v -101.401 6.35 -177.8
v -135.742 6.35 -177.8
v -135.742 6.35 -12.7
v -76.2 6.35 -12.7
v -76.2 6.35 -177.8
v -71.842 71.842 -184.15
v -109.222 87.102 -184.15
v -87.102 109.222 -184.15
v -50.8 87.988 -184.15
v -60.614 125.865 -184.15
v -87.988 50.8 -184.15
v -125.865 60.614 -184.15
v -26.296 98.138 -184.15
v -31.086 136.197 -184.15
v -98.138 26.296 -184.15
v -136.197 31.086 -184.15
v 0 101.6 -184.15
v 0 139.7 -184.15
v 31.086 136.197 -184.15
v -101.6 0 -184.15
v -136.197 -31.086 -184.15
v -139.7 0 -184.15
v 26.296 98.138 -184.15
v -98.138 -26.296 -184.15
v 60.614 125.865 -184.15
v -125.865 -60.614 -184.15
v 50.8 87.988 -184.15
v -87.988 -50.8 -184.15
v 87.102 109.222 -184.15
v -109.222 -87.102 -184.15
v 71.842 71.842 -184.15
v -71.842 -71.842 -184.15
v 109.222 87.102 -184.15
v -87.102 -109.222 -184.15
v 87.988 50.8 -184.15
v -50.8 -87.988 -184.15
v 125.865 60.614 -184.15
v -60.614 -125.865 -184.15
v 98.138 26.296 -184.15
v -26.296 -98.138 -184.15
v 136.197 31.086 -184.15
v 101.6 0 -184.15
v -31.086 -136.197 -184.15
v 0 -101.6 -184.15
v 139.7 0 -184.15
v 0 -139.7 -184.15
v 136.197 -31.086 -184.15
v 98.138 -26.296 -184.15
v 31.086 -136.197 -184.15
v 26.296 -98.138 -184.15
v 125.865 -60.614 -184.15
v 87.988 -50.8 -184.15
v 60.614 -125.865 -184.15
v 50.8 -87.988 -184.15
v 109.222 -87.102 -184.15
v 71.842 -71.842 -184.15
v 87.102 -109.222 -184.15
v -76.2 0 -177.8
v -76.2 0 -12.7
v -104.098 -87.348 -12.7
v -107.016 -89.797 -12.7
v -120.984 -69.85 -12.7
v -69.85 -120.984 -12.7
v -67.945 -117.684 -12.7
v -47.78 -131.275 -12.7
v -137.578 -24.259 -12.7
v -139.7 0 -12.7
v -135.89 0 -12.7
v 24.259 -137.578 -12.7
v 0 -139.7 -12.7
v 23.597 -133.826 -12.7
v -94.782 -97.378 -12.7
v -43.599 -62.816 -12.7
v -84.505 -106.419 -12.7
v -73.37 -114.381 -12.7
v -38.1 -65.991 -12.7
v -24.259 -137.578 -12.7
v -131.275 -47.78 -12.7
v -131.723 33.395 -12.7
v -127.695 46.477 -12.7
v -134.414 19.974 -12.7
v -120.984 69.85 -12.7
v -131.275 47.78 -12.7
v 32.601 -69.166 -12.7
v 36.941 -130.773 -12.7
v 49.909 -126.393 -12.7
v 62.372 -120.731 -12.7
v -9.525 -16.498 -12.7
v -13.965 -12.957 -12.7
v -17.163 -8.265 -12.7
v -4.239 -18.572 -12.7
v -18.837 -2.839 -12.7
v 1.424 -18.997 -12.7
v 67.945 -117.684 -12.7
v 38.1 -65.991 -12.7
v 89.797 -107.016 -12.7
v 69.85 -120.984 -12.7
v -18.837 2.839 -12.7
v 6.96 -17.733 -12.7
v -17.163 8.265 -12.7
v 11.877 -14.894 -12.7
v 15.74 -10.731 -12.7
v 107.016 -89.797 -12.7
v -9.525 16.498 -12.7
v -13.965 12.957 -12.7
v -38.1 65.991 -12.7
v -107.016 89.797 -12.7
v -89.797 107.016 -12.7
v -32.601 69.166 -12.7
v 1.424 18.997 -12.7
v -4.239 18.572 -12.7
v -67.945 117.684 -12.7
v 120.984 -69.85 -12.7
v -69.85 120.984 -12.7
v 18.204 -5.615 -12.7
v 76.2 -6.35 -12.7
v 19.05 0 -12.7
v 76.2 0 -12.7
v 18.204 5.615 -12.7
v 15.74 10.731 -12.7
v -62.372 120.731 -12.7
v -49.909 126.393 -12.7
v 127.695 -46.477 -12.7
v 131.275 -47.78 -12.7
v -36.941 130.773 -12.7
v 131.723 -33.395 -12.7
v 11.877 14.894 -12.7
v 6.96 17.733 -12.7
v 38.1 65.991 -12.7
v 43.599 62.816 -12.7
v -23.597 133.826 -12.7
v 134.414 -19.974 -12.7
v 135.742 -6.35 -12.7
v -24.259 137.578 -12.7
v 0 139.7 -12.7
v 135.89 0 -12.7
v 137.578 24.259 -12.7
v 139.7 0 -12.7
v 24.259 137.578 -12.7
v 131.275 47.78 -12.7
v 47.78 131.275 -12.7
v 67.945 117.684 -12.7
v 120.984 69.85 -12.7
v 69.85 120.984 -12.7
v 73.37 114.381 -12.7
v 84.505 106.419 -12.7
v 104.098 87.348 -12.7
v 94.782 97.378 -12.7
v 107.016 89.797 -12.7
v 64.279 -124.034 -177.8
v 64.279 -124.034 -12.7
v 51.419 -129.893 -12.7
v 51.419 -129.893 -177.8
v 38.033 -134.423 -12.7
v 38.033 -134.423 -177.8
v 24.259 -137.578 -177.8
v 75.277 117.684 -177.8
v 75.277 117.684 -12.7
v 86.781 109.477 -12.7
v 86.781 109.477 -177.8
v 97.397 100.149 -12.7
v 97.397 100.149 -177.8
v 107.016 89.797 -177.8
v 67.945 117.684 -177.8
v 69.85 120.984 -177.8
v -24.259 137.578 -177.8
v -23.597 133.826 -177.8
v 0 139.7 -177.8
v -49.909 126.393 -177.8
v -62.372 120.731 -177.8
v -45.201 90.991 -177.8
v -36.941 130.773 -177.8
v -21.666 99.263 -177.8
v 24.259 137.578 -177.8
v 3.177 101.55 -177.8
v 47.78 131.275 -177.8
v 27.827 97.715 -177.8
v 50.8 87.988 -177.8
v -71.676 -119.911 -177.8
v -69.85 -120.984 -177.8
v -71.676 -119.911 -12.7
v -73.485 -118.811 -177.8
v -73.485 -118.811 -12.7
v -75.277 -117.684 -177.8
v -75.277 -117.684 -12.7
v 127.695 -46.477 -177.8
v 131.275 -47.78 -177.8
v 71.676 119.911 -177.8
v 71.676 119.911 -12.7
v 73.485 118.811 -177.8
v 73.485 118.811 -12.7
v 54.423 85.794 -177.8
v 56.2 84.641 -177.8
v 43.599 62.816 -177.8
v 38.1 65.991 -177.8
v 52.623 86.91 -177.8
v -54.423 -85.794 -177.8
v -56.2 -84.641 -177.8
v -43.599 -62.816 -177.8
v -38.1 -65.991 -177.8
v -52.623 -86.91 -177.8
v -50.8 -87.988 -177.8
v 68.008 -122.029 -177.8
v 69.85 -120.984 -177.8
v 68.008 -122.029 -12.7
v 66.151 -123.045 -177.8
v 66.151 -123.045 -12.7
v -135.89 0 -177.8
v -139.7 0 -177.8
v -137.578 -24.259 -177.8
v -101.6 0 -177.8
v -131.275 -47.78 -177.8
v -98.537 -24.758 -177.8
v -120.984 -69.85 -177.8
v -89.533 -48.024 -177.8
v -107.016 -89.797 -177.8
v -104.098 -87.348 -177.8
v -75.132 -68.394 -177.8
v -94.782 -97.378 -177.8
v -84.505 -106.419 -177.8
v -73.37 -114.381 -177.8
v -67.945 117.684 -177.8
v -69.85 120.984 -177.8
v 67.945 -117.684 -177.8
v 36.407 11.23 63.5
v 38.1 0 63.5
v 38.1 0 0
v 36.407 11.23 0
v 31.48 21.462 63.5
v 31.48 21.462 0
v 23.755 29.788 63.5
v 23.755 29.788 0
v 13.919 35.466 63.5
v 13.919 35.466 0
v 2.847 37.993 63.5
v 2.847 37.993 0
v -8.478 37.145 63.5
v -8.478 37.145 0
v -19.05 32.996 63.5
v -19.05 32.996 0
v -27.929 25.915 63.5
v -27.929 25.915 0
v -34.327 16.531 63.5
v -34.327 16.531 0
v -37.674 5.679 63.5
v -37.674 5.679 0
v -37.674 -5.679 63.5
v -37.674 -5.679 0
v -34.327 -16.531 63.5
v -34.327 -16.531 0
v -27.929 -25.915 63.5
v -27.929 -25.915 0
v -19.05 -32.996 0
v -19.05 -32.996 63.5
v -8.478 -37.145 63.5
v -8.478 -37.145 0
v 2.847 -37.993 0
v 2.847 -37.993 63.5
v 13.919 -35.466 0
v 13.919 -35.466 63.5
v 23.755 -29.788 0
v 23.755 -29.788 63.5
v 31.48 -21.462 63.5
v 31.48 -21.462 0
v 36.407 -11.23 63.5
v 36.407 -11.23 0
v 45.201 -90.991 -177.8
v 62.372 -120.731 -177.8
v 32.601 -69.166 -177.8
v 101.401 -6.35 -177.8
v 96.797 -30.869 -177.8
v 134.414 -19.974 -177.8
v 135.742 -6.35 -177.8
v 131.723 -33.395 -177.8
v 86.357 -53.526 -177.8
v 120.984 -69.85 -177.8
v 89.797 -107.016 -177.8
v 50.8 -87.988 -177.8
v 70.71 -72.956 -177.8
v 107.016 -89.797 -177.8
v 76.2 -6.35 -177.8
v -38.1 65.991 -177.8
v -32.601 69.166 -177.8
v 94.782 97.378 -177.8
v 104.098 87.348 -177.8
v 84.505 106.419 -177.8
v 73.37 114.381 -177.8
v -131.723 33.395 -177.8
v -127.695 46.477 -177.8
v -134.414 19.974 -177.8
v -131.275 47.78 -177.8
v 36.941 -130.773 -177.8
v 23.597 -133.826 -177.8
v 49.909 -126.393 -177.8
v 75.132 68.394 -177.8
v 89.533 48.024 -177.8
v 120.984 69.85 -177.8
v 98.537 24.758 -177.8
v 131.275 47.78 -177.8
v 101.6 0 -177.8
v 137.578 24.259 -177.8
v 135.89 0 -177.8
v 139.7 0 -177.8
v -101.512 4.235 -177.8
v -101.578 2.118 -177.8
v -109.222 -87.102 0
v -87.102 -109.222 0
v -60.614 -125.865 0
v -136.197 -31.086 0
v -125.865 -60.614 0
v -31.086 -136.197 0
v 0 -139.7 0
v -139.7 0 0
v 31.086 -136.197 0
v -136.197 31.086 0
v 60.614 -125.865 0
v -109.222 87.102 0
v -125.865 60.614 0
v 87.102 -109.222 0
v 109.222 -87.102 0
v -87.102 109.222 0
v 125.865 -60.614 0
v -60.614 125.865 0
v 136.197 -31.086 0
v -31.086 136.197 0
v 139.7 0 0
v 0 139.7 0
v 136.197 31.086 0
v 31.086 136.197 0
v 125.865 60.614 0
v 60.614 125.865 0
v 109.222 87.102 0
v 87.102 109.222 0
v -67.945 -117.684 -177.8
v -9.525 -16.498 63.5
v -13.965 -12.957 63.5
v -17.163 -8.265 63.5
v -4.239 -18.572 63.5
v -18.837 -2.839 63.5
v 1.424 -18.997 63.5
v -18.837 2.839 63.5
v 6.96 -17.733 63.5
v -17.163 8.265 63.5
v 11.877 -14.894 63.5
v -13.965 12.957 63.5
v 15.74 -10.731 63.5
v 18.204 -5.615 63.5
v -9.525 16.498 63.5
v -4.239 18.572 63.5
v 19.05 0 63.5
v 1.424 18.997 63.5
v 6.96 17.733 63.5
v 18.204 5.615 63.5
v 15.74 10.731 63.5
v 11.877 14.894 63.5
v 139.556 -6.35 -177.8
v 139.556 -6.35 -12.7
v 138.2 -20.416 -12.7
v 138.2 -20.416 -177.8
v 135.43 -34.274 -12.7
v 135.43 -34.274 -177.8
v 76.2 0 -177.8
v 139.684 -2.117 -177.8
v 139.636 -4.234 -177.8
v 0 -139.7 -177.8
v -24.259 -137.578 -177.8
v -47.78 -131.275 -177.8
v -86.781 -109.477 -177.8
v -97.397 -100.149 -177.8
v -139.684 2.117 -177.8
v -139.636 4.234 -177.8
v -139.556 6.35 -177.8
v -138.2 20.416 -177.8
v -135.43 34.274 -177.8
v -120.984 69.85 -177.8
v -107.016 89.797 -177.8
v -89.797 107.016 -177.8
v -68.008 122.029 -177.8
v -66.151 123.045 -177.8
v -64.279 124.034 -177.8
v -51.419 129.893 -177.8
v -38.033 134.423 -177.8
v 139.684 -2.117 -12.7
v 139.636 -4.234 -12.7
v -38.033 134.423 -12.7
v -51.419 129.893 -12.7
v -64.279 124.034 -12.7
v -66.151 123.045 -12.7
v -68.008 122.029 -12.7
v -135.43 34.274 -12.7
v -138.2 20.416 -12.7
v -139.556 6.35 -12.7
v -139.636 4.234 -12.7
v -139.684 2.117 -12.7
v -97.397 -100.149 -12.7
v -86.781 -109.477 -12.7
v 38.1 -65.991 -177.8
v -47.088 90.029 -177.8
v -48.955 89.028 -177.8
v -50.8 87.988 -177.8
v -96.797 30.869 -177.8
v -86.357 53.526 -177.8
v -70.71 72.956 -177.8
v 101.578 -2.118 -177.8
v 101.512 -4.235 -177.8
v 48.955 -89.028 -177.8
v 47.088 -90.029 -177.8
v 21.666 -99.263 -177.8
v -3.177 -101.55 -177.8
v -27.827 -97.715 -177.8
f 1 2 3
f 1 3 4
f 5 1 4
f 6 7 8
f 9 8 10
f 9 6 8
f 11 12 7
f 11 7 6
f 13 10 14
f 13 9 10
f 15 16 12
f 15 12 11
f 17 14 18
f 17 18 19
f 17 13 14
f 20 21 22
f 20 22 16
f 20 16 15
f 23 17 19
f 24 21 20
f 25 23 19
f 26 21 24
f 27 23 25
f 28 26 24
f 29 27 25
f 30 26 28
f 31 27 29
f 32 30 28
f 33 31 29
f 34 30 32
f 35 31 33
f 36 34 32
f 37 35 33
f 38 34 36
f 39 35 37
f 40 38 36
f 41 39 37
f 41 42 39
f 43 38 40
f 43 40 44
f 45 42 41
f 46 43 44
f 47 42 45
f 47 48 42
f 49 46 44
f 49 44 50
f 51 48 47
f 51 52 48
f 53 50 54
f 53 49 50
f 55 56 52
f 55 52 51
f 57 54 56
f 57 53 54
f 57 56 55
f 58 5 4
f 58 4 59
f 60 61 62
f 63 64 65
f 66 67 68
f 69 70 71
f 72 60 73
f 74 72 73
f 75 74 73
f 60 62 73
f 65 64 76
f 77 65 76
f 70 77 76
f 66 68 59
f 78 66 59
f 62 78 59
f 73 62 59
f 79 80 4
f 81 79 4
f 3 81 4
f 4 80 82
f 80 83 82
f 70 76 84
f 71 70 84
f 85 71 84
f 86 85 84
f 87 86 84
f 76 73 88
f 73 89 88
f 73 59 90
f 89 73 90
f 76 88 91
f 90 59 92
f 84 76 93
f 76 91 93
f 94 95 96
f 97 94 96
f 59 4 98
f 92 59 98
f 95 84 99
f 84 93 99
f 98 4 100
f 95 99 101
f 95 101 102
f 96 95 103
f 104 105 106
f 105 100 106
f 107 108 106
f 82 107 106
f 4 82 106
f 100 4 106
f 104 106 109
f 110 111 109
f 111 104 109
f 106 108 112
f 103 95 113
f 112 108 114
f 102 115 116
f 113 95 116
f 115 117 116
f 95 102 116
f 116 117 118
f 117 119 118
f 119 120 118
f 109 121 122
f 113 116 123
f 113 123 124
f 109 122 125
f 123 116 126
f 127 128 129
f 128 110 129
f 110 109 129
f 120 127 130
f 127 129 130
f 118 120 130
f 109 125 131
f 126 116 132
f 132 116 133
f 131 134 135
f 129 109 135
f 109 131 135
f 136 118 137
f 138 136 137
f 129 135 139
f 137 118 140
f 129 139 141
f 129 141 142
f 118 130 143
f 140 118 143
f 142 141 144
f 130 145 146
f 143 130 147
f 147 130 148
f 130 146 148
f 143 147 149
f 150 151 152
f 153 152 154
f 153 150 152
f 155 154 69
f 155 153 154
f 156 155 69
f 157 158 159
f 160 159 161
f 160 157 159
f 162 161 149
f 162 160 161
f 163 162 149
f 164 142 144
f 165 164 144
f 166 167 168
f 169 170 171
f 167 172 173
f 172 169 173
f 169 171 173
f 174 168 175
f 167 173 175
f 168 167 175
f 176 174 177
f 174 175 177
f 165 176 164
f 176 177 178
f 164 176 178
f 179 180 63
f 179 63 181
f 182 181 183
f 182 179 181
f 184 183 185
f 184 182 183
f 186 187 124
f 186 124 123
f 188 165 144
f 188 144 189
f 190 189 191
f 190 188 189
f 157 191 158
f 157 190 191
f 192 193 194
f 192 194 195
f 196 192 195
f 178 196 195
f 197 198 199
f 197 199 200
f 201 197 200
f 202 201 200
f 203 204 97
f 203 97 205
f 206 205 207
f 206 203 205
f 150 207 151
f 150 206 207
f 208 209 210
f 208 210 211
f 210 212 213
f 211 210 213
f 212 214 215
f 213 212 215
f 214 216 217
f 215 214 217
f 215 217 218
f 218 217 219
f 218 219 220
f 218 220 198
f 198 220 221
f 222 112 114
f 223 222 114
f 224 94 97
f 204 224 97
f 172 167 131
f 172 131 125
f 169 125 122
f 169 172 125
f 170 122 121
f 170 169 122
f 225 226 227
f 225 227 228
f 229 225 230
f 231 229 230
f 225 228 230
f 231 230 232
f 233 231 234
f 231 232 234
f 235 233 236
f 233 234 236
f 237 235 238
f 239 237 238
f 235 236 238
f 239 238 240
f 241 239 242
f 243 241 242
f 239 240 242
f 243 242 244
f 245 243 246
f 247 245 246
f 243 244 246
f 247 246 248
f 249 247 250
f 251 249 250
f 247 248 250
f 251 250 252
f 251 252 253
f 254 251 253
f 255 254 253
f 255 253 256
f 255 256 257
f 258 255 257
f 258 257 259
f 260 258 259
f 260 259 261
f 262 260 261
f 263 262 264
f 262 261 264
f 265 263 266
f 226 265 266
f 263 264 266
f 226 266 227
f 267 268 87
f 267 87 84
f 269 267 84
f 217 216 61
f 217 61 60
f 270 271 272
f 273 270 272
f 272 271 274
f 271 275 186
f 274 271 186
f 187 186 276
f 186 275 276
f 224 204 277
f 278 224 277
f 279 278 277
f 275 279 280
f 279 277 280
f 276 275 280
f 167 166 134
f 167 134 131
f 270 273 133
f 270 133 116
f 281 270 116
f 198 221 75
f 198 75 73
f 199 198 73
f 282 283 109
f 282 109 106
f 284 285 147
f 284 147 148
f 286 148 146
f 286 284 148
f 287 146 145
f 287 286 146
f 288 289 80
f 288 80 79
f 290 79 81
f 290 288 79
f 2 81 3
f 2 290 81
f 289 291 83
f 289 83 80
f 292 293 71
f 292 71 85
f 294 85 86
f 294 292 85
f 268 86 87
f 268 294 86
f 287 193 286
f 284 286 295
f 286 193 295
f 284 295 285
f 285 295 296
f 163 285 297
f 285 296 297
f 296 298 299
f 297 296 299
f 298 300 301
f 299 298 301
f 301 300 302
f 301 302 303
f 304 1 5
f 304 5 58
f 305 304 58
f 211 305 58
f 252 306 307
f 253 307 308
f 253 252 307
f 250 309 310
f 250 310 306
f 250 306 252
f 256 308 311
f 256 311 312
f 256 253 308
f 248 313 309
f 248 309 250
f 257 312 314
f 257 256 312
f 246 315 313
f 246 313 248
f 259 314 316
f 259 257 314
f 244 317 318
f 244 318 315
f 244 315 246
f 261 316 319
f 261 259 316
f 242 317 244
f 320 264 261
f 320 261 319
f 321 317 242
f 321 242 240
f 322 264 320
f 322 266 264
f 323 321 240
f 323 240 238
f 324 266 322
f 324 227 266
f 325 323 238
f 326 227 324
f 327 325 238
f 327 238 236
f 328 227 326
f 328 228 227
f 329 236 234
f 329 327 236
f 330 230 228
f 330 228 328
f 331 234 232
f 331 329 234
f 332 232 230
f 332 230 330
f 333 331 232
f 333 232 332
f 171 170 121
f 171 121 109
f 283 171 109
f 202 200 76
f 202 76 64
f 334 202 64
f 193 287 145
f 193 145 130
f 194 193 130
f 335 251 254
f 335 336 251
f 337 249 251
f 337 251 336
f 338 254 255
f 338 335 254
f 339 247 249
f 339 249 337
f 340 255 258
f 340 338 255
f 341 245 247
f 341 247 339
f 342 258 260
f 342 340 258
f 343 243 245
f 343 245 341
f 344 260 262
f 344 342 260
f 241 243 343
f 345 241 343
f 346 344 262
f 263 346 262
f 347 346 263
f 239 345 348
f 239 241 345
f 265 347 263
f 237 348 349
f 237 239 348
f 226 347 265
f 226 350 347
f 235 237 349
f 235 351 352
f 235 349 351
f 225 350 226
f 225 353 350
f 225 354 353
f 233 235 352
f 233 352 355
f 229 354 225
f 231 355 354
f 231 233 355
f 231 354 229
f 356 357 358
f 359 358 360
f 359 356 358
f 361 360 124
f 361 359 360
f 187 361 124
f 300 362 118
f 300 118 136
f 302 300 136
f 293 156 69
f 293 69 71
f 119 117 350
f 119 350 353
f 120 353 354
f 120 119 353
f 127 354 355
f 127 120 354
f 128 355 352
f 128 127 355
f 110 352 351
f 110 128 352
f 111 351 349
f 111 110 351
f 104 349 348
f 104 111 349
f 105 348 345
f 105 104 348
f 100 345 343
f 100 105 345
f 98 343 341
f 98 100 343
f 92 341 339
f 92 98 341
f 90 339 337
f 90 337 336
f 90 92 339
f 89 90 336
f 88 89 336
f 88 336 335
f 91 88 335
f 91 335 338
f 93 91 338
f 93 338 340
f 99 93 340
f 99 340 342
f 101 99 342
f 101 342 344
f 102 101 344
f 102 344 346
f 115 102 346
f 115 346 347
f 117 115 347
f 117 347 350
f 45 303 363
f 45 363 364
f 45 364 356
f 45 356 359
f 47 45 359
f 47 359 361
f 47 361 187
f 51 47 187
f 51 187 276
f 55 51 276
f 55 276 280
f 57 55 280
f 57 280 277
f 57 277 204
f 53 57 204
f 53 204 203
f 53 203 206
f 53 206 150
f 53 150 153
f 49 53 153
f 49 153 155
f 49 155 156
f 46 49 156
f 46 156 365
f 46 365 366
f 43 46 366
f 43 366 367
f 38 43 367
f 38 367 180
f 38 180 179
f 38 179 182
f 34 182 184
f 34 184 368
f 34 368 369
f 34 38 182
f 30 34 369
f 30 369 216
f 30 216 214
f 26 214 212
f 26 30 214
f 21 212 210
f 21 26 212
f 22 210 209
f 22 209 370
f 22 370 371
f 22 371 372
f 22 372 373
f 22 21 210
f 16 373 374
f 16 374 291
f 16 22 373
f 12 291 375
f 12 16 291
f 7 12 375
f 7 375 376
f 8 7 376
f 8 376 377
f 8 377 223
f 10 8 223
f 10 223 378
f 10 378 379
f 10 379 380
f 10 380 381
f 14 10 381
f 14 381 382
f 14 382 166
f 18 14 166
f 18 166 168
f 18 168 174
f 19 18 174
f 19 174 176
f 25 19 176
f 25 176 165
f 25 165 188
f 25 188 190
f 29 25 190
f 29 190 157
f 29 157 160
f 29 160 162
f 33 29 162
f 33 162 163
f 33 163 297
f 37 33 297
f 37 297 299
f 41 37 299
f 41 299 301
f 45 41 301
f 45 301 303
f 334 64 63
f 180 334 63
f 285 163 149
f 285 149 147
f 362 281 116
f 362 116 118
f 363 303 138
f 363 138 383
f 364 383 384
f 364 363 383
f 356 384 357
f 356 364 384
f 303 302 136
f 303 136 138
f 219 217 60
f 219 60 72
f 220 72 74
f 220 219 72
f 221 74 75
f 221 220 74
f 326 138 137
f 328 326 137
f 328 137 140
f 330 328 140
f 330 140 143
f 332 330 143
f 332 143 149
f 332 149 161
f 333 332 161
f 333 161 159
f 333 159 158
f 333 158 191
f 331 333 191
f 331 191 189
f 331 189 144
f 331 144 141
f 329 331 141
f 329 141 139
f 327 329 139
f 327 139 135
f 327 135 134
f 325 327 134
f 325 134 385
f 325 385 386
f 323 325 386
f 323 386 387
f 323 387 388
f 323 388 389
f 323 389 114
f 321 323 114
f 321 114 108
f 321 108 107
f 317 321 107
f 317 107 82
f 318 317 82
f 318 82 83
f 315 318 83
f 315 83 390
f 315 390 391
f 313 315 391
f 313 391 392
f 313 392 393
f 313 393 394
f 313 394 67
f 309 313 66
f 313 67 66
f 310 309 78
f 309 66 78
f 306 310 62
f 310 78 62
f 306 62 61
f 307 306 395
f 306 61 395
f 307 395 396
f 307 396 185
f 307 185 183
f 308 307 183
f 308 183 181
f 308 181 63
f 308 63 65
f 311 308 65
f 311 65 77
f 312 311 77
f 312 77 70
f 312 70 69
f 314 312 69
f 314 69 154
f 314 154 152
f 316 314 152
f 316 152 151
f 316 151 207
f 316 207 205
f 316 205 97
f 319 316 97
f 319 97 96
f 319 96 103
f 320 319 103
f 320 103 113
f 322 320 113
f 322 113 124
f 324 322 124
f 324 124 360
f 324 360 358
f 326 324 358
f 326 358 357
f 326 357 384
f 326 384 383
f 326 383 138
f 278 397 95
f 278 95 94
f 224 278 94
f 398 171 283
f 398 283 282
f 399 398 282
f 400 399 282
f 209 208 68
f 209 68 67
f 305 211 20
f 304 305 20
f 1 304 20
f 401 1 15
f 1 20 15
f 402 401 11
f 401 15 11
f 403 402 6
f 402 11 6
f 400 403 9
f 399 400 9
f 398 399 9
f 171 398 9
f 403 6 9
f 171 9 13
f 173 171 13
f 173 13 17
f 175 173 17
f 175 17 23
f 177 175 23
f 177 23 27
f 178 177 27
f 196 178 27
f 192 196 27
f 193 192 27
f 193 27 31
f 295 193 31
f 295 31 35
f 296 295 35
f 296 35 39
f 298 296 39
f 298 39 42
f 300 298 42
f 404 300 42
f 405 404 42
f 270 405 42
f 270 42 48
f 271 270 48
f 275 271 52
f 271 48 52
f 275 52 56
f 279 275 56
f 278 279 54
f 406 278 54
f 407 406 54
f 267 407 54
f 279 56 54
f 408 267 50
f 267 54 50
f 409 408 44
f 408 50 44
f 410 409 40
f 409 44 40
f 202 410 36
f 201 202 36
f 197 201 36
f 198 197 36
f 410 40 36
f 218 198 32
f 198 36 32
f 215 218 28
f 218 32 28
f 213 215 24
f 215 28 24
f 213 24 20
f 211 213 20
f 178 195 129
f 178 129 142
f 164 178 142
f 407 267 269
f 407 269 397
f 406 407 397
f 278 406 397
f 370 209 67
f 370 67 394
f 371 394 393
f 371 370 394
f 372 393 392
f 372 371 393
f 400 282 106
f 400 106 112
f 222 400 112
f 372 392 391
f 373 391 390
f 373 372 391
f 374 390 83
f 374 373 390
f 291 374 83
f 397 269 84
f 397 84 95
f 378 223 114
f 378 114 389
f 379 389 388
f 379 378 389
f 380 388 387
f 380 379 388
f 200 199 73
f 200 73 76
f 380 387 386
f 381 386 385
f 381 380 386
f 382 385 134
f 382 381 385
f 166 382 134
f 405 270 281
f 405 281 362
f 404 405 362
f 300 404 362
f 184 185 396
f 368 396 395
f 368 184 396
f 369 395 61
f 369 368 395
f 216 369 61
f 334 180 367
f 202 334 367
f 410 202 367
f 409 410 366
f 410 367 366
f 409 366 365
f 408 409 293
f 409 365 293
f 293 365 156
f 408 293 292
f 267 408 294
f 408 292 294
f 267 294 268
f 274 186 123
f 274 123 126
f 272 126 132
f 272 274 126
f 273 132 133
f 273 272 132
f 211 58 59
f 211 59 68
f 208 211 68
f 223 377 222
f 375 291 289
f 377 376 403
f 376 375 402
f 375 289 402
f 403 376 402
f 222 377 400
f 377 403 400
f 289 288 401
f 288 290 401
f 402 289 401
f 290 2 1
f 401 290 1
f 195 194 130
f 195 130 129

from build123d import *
from build123d.topology import SkipClean

# Parameters (mm, degrees)
SKETCH1_R           = 38.1
SKETCH1_R_2         = 19.05
BOSS_EXTRUDE1_DEPTH = 63.5
BOSS_EXTRUDE2_START = -12.7
SKETCH1_3_R         = 139.7
SKETCH1_3_R_2       = 19.05
BOSS_EXTRUDE2_DEPTH = 12.7
BOSS_EXTRUDE3_START = 165.1
BOSS_EXTRUDE3_DEPTH = 165.1
CIRPATTERN2_COUNT   = 6
BOSS_EXTRUDE4_START = 6.35
SKETCH3_R           = 139.7
SKETCH3_R_2         = 101.6
BOSS_EXTRUDE4_DEPTH = 6.35


with BuildPart() as part:
    # Sketch1 → Boss-Extrude1 (new body)
    with BuildSketch(Plane.XY):
        Circle(SKETCH1_R)
        Circle(SKETCH1_R_2, mode=Mode.SUBTRACT)
    extrude(amount=BOSS_EXTRUDE1_DEPTH)

    # Sketch1<3> → Boss-Extrude2 (add)
    with BuildSketch(Plane.XY.offset(BOSS_EXTRUDE2_START)):
        Circle(SKETCH1_3_R)
        Circle(SKETCH1_3_R_2, mode=Mode.SUBTRACT)
    extrude(amount=BOSS_EXTRUDE2_DEPTH)

    # Sketch2 → Boss-Extrude3 (add)
    with SkipClean():  # the faces are left unmerged after this step: merging them gives an invalid solid
        with BuildSketch(Plane(origin=(0, 0, -12.7), x_dir=(-1, 0, 0), z_dir=(0, 0, -1)).offset(BOSS_EXTRUDE3_START)):
            with BuildLine():
                Line((-43.599261314, 62.816135768), (-38.1, 65.991135768))
                Line((-38.1, 65.991135768), (-69.85, 120.983748909))
                ThreePointArc((-69.85, 120.983748909), (-89.797429073, 107.016408704), (-107.016408704, 89.797429073))
                Line((-107.016408704, 89.797429073), (-104.097779375, 87.34840828))
                ThreePointArc((-104.097779375, 87.34840828), (-89.757405887, 102.027938274), (-73.370038531, 114.380634489))
                Line((-73.370038531, 114.380634489), (-43.599261314, 62.816135768))
            make_face()
        boss_extrude3 = extrude(amount=-BOSS_EXTRUDE3_DEPTH)

    # CirPattern2: Boss-Extrude3 ×6 about axis
    with SkipClean():  # the faces are left unmerged after this step: merging them gives an invalid solid
        cirpattern2_axis = Axis((0, 0, -12.7), (0, 0, 1))
        for i in range(1, CIRPATTERN2_COUNT):
            add(boss_extrude3.rotate(cirpattern2_axis, i * 360 / CIRPATTERN2_COUNT))

    # Sketch3 → Boss-Extrude4 (add)
    with SkipClean():  # the faces are left unmerged after this step: merging them gives an invalid solid
        with BuildSketch(Plane(origin=(0, 0, -177.8), x_dir=(-1, 0, 0), z_dir=(0, 0, -1)).offset(BOSS_EXTRUDE4_START)):
            Circle(SKETCH3_R)
            Circle(SKETCH3_R_2, mode=Mode.SUBTRACT)
        extrude(amount=-BOSS_EXTRUDE4_DEPTH)


solid = part.part
